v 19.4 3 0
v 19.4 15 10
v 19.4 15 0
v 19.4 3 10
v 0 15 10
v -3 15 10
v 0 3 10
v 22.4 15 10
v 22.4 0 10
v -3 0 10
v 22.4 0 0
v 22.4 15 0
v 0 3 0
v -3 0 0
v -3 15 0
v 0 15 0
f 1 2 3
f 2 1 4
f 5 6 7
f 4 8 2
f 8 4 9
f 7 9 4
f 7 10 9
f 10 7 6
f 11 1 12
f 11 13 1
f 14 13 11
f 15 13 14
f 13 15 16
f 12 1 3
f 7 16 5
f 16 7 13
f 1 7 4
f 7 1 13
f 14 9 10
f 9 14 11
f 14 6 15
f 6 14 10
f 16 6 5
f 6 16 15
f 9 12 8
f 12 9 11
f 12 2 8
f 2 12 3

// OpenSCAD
// [FL_INDEX: keywords="openscad, 3d_parametric, Book_binding_clips, csg_solid" | COT="Parametric OpenSCAD design from 3DCodeverse"]
// Title: Book binding clips

//book thickness (mm)
thickness = 19.4;

cube(size=[thickness,3,10]);
translate([-3,0,0])
cube(size=[3,15,10]);
translate([thickness,0,0])
cube(size=[3,15,10]);
